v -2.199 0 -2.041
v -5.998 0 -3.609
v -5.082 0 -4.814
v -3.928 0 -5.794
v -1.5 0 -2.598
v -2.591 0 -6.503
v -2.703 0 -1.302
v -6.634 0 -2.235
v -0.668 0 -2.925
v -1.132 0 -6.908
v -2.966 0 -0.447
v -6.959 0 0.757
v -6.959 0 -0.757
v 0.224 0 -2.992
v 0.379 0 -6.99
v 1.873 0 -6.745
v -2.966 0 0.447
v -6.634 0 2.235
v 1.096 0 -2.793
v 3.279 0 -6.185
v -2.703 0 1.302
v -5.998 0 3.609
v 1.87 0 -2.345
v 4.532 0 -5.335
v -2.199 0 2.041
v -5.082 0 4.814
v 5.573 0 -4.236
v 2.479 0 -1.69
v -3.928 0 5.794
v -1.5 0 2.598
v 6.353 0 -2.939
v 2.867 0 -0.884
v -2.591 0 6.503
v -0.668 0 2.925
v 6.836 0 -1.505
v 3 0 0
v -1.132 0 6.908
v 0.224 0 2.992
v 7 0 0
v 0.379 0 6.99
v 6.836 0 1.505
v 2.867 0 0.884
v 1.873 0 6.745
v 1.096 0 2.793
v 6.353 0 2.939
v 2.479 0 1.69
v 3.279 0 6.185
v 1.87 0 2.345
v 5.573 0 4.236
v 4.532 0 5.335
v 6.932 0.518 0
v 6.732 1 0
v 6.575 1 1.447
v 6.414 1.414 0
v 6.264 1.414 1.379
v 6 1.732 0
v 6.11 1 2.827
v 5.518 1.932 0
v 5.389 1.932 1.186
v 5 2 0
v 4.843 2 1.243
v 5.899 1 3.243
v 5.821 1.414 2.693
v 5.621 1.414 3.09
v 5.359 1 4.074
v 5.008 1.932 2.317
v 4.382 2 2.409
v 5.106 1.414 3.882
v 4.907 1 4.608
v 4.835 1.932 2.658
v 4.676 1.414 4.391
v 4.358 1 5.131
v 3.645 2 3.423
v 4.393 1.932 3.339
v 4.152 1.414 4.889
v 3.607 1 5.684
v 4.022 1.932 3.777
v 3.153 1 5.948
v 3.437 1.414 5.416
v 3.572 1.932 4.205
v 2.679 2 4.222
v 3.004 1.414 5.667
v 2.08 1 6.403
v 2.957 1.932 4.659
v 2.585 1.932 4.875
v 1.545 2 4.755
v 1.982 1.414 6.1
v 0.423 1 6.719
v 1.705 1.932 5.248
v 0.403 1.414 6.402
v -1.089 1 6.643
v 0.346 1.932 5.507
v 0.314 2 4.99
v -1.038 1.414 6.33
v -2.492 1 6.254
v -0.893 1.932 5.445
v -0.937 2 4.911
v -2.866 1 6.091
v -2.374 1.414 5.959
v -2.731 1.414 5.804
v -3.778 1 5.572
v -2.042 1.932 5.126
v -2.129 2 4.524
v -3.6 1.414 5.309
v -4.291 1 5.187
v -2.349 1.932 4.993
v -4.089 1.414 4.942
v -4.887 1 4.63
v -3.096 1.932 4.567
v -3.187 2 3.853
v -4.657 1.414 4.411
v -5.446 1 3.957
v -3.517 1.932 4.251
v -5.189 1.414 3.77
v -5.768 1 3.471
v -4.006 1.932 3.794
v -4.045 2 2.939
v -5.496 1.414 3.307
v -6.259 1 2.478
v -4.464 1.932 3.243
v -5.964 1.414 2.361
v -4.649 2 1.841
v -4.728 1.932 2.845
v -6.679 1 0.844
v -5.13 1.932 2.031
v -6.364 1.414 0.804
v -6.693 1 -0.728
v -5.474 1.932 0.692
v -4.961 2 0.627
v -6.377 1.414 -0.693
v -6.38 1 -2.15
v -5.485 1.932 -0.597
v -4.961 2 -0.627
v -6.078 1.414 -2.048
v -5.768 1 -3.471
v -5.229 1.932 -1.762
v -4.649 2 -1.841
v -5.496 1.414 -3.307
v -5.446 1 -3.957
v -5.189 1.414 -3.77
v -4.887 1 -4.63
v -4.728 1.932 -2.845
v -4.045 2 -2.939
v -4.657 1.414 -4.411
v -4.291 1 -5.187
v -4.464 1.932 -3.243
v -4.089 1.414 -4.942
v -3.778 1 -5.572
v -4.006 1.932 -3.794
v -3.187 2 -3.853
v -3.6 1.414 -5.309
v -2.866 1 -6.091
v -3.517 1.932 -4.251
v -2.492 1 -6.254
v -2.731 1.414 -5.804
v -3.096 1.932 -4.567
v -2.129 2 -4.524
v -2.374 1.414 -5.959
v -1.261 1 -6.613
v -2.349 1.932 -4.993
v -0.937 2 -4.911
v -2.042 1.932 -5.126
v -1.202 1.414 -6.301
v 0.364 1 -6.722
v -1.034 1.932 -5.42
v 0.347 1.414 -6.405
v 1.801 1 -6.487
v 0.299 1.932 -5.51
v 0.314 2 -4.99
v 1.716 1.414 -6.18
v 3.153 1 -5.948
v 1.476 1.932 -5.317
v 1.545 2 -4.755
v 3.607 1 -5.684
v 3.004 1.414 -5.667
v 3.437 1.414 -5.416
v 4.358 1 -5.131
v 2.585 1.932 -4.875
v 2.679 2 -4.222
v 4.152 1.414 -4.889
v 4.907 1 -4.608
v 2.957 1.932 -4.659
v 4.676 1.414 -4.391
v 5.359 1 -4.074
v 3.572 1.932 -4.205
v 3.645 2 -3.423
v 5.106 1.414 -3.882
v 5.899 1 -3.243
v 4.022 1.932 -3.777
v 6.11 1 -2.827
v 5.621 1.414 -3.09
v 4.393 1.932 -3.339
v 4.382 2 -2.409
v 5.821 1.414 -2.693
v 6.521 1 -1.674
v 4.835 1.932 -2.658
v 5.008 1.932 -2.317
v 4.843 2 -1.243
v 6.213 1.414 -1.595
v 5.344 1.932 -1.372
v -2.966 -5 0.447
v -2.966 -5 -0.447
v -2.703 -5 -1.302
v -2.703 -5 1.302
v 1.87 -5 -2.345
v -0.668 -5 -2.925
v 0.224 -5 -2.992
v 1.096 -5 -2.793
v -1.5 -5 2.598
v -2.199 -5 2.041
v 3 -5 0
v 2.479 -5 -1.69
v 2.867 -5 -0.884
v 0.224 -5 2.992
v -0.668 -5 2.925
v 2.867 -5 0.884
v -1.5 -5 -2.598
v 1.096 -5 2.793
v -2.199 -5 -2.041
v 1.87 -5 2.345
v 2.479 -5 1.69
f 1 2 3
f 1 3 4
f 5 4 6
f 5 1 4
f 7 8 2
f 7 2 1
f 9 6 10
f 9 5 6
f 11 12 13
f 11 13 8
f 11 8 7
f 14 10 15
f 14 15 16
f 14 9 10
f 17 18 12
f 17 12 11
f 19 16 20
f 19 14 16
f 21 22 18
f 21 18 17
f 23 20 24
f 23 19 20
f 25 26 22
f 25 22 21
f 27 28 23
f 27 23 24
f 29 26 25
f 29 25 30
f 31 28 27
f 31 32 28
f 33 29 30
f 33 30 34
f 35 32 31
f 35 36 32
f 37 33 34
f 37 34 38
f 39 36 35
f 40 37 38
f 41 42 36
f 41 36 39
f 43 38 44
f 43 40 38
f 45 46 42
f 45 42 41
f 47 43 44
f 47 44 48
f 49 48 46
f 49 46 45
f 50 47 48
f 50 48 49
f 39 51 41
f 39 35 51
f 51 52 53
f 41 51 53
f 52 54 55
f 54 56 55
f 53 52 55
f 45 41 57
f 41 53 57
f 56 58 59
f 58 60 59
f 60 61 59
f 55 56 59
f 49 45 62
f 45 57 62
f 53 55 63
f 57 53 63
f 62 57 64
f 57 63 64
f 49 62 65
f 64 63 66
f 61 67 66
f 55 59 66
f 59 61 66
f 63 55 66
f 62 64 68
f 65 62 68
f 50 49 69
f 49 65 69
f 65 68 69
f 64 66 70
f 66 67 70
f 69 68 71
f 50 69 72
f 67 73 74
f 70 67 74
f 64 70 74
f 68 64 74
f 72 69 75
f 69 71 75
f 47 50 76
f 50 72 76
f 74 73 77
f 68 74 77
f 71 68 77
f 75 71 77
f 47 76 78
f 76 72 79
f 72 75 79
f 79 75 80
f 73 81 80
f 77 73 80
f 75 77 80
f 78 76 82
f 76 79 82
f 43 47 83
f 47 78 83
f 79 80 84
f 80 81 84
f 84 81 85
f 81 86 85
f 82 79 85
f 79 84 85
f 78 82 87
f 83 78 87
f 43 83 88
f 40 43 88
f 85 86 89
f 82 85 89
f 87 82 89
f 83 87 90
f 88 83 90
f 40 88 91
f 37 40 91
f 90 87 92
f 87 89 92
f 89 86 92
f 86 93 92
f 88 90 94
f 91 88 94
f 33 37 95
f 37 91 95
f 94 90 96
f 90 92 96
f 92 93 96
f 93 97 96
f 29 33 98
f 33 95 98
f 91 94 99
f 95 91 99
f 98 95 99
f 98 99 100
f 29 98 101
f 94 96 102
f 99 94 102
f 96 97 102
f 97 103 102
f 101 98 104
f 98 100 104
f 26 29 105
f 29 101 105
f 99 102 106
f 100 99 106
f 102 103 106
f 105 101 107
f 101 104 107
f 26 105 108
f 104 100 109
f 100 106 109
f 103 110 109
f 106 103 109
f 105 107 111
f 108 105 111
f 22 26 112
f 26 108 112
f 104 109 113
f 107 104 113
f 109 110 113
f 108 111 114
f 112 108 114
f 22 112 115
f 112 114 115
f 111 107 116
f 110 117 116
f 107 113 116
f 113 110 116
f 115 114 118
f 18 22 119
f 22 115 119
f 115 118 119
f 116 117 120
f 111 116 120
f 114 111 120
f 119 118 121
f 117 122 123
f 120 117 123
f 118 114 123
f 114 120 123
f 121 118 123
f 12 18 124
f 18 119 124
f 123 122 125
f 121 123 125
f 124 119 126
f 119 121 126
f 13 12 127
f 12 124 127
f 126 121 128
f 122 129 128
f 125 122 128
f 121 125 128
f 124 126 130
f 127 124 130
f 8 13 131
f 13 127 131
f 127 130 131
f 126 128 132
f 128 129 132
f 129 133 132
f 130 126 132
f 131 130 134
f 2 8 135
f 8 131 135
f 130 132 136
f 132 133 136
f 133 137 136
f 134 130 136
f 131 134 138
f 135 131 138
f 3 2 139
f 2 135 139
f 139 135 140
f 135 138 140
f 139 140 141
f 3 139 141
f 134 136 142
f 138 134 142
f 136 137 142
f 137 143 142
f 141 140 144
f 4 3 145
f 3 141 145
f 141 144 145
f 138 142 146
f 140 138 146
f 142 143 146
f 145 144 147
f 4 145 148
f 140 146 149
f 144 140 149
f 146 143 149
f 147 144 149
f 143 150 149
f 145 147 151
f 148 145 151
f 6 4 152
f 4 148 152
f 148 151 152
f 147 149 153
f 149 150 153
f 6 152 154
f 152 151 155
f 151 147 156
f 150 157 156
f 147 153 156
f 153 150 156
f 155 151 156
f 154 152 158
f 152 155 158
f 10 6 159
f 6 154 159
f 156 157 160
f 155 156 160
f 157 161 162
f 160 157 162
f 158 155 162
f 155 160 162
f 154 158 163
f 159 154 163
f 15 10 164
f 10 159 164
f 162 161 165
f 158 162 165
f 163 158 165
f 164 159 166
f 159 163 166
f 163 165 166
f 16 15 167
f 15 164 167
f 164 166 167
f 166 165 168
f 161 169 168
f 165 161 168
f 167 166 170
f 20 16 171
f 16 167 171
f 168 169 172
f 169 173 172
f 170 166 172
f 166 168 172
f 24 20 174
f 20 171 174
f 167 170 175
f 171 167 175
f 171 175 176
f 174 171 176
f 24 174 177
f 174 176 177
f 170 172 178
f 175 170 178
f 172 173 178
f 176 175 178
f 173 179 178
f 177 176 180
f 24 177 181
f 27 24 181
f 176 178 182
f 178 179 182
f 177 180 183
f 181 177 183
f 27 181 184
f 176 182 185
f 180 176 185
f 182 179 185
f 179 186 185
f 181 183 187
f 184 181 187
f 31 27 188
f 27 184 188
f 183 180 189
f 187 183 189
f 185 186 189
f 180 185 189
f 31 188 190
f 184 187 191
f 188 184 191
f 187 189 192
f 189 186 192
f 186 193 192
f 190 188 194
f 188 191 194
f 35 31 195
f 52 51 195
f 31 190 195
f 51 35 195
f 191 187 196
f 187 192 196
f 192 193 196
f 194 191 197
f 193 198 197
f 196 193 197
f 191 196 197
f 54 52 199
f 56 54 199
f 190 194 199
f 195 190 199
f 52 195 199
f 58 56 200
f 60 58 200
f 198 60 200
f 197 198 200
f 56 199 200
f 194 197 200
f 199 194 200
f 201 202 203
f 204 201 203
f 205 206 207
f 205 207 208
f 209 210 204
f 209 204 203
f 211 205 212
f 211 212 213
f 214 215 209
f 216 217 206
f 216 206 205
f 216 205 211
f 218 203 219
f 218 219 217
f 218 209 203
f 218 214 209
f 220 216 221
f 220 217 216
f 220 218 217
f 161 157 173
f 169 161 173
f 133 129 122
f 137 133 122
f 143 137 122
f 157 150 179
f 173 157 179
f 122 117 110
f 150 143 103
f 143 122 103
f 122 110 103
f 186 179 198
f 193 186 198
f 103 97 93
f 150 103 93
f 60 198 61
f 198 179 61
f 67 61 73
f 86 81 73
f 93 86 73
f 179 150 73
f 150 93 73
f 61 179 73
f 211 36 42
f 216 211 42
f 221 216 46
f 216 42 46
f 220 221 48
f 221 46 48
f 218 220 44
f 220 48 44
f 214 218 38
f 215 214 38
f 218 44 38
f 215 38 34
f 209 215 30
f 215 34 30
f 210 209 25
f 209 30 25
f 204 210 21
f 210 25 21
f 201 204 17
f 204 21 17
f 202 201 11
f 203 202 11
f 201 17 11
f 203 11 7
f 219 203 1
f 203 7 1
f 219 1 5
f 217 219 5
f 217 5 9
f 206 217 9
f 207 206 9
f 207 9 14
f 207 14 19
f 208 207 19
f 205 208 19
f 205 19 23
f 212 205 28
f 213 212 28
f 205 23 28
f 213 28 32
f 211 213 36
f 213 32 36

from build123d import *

# Parameters (mm, degrees)
F0_R     = 3
F1_DEPTH = 5
F0_R_2   = 7
F2_DEPTH = 2
F3_R     = 1.99999


# Not quite as in the source:
# - a fillet or chamfer is up to 0.001 mm smaller than in the source, because OpenCascade refuses the exact size


with BuildPart() as f1:
    # F0 (on Front) → F1 (new body)
    with BuildSketch(Plane.XZ):
        Circle(F0_R)
    extrude(amount=F1_DEPTH)

    # F0 (on Front) → F2 (join)
    with BuildSketch(Plane.XZ):
        Circle(F0_R_2)
        Circle(F0_R, mode=Mode.SUBTRACT)
        Circle(F0_R)
    extrude(amount=-F2_DEPTH)

    # F3 (radius 2 in the source; OpenCascade refuses exactly that, so slightly less here)
    f3_edges = [f1.edges().sort_by_distance(p)[0] for p in [
        (-7, 2, 0),
    ]]
    fillet(f3_edges, radius=F3_R)


solid = f1.part
